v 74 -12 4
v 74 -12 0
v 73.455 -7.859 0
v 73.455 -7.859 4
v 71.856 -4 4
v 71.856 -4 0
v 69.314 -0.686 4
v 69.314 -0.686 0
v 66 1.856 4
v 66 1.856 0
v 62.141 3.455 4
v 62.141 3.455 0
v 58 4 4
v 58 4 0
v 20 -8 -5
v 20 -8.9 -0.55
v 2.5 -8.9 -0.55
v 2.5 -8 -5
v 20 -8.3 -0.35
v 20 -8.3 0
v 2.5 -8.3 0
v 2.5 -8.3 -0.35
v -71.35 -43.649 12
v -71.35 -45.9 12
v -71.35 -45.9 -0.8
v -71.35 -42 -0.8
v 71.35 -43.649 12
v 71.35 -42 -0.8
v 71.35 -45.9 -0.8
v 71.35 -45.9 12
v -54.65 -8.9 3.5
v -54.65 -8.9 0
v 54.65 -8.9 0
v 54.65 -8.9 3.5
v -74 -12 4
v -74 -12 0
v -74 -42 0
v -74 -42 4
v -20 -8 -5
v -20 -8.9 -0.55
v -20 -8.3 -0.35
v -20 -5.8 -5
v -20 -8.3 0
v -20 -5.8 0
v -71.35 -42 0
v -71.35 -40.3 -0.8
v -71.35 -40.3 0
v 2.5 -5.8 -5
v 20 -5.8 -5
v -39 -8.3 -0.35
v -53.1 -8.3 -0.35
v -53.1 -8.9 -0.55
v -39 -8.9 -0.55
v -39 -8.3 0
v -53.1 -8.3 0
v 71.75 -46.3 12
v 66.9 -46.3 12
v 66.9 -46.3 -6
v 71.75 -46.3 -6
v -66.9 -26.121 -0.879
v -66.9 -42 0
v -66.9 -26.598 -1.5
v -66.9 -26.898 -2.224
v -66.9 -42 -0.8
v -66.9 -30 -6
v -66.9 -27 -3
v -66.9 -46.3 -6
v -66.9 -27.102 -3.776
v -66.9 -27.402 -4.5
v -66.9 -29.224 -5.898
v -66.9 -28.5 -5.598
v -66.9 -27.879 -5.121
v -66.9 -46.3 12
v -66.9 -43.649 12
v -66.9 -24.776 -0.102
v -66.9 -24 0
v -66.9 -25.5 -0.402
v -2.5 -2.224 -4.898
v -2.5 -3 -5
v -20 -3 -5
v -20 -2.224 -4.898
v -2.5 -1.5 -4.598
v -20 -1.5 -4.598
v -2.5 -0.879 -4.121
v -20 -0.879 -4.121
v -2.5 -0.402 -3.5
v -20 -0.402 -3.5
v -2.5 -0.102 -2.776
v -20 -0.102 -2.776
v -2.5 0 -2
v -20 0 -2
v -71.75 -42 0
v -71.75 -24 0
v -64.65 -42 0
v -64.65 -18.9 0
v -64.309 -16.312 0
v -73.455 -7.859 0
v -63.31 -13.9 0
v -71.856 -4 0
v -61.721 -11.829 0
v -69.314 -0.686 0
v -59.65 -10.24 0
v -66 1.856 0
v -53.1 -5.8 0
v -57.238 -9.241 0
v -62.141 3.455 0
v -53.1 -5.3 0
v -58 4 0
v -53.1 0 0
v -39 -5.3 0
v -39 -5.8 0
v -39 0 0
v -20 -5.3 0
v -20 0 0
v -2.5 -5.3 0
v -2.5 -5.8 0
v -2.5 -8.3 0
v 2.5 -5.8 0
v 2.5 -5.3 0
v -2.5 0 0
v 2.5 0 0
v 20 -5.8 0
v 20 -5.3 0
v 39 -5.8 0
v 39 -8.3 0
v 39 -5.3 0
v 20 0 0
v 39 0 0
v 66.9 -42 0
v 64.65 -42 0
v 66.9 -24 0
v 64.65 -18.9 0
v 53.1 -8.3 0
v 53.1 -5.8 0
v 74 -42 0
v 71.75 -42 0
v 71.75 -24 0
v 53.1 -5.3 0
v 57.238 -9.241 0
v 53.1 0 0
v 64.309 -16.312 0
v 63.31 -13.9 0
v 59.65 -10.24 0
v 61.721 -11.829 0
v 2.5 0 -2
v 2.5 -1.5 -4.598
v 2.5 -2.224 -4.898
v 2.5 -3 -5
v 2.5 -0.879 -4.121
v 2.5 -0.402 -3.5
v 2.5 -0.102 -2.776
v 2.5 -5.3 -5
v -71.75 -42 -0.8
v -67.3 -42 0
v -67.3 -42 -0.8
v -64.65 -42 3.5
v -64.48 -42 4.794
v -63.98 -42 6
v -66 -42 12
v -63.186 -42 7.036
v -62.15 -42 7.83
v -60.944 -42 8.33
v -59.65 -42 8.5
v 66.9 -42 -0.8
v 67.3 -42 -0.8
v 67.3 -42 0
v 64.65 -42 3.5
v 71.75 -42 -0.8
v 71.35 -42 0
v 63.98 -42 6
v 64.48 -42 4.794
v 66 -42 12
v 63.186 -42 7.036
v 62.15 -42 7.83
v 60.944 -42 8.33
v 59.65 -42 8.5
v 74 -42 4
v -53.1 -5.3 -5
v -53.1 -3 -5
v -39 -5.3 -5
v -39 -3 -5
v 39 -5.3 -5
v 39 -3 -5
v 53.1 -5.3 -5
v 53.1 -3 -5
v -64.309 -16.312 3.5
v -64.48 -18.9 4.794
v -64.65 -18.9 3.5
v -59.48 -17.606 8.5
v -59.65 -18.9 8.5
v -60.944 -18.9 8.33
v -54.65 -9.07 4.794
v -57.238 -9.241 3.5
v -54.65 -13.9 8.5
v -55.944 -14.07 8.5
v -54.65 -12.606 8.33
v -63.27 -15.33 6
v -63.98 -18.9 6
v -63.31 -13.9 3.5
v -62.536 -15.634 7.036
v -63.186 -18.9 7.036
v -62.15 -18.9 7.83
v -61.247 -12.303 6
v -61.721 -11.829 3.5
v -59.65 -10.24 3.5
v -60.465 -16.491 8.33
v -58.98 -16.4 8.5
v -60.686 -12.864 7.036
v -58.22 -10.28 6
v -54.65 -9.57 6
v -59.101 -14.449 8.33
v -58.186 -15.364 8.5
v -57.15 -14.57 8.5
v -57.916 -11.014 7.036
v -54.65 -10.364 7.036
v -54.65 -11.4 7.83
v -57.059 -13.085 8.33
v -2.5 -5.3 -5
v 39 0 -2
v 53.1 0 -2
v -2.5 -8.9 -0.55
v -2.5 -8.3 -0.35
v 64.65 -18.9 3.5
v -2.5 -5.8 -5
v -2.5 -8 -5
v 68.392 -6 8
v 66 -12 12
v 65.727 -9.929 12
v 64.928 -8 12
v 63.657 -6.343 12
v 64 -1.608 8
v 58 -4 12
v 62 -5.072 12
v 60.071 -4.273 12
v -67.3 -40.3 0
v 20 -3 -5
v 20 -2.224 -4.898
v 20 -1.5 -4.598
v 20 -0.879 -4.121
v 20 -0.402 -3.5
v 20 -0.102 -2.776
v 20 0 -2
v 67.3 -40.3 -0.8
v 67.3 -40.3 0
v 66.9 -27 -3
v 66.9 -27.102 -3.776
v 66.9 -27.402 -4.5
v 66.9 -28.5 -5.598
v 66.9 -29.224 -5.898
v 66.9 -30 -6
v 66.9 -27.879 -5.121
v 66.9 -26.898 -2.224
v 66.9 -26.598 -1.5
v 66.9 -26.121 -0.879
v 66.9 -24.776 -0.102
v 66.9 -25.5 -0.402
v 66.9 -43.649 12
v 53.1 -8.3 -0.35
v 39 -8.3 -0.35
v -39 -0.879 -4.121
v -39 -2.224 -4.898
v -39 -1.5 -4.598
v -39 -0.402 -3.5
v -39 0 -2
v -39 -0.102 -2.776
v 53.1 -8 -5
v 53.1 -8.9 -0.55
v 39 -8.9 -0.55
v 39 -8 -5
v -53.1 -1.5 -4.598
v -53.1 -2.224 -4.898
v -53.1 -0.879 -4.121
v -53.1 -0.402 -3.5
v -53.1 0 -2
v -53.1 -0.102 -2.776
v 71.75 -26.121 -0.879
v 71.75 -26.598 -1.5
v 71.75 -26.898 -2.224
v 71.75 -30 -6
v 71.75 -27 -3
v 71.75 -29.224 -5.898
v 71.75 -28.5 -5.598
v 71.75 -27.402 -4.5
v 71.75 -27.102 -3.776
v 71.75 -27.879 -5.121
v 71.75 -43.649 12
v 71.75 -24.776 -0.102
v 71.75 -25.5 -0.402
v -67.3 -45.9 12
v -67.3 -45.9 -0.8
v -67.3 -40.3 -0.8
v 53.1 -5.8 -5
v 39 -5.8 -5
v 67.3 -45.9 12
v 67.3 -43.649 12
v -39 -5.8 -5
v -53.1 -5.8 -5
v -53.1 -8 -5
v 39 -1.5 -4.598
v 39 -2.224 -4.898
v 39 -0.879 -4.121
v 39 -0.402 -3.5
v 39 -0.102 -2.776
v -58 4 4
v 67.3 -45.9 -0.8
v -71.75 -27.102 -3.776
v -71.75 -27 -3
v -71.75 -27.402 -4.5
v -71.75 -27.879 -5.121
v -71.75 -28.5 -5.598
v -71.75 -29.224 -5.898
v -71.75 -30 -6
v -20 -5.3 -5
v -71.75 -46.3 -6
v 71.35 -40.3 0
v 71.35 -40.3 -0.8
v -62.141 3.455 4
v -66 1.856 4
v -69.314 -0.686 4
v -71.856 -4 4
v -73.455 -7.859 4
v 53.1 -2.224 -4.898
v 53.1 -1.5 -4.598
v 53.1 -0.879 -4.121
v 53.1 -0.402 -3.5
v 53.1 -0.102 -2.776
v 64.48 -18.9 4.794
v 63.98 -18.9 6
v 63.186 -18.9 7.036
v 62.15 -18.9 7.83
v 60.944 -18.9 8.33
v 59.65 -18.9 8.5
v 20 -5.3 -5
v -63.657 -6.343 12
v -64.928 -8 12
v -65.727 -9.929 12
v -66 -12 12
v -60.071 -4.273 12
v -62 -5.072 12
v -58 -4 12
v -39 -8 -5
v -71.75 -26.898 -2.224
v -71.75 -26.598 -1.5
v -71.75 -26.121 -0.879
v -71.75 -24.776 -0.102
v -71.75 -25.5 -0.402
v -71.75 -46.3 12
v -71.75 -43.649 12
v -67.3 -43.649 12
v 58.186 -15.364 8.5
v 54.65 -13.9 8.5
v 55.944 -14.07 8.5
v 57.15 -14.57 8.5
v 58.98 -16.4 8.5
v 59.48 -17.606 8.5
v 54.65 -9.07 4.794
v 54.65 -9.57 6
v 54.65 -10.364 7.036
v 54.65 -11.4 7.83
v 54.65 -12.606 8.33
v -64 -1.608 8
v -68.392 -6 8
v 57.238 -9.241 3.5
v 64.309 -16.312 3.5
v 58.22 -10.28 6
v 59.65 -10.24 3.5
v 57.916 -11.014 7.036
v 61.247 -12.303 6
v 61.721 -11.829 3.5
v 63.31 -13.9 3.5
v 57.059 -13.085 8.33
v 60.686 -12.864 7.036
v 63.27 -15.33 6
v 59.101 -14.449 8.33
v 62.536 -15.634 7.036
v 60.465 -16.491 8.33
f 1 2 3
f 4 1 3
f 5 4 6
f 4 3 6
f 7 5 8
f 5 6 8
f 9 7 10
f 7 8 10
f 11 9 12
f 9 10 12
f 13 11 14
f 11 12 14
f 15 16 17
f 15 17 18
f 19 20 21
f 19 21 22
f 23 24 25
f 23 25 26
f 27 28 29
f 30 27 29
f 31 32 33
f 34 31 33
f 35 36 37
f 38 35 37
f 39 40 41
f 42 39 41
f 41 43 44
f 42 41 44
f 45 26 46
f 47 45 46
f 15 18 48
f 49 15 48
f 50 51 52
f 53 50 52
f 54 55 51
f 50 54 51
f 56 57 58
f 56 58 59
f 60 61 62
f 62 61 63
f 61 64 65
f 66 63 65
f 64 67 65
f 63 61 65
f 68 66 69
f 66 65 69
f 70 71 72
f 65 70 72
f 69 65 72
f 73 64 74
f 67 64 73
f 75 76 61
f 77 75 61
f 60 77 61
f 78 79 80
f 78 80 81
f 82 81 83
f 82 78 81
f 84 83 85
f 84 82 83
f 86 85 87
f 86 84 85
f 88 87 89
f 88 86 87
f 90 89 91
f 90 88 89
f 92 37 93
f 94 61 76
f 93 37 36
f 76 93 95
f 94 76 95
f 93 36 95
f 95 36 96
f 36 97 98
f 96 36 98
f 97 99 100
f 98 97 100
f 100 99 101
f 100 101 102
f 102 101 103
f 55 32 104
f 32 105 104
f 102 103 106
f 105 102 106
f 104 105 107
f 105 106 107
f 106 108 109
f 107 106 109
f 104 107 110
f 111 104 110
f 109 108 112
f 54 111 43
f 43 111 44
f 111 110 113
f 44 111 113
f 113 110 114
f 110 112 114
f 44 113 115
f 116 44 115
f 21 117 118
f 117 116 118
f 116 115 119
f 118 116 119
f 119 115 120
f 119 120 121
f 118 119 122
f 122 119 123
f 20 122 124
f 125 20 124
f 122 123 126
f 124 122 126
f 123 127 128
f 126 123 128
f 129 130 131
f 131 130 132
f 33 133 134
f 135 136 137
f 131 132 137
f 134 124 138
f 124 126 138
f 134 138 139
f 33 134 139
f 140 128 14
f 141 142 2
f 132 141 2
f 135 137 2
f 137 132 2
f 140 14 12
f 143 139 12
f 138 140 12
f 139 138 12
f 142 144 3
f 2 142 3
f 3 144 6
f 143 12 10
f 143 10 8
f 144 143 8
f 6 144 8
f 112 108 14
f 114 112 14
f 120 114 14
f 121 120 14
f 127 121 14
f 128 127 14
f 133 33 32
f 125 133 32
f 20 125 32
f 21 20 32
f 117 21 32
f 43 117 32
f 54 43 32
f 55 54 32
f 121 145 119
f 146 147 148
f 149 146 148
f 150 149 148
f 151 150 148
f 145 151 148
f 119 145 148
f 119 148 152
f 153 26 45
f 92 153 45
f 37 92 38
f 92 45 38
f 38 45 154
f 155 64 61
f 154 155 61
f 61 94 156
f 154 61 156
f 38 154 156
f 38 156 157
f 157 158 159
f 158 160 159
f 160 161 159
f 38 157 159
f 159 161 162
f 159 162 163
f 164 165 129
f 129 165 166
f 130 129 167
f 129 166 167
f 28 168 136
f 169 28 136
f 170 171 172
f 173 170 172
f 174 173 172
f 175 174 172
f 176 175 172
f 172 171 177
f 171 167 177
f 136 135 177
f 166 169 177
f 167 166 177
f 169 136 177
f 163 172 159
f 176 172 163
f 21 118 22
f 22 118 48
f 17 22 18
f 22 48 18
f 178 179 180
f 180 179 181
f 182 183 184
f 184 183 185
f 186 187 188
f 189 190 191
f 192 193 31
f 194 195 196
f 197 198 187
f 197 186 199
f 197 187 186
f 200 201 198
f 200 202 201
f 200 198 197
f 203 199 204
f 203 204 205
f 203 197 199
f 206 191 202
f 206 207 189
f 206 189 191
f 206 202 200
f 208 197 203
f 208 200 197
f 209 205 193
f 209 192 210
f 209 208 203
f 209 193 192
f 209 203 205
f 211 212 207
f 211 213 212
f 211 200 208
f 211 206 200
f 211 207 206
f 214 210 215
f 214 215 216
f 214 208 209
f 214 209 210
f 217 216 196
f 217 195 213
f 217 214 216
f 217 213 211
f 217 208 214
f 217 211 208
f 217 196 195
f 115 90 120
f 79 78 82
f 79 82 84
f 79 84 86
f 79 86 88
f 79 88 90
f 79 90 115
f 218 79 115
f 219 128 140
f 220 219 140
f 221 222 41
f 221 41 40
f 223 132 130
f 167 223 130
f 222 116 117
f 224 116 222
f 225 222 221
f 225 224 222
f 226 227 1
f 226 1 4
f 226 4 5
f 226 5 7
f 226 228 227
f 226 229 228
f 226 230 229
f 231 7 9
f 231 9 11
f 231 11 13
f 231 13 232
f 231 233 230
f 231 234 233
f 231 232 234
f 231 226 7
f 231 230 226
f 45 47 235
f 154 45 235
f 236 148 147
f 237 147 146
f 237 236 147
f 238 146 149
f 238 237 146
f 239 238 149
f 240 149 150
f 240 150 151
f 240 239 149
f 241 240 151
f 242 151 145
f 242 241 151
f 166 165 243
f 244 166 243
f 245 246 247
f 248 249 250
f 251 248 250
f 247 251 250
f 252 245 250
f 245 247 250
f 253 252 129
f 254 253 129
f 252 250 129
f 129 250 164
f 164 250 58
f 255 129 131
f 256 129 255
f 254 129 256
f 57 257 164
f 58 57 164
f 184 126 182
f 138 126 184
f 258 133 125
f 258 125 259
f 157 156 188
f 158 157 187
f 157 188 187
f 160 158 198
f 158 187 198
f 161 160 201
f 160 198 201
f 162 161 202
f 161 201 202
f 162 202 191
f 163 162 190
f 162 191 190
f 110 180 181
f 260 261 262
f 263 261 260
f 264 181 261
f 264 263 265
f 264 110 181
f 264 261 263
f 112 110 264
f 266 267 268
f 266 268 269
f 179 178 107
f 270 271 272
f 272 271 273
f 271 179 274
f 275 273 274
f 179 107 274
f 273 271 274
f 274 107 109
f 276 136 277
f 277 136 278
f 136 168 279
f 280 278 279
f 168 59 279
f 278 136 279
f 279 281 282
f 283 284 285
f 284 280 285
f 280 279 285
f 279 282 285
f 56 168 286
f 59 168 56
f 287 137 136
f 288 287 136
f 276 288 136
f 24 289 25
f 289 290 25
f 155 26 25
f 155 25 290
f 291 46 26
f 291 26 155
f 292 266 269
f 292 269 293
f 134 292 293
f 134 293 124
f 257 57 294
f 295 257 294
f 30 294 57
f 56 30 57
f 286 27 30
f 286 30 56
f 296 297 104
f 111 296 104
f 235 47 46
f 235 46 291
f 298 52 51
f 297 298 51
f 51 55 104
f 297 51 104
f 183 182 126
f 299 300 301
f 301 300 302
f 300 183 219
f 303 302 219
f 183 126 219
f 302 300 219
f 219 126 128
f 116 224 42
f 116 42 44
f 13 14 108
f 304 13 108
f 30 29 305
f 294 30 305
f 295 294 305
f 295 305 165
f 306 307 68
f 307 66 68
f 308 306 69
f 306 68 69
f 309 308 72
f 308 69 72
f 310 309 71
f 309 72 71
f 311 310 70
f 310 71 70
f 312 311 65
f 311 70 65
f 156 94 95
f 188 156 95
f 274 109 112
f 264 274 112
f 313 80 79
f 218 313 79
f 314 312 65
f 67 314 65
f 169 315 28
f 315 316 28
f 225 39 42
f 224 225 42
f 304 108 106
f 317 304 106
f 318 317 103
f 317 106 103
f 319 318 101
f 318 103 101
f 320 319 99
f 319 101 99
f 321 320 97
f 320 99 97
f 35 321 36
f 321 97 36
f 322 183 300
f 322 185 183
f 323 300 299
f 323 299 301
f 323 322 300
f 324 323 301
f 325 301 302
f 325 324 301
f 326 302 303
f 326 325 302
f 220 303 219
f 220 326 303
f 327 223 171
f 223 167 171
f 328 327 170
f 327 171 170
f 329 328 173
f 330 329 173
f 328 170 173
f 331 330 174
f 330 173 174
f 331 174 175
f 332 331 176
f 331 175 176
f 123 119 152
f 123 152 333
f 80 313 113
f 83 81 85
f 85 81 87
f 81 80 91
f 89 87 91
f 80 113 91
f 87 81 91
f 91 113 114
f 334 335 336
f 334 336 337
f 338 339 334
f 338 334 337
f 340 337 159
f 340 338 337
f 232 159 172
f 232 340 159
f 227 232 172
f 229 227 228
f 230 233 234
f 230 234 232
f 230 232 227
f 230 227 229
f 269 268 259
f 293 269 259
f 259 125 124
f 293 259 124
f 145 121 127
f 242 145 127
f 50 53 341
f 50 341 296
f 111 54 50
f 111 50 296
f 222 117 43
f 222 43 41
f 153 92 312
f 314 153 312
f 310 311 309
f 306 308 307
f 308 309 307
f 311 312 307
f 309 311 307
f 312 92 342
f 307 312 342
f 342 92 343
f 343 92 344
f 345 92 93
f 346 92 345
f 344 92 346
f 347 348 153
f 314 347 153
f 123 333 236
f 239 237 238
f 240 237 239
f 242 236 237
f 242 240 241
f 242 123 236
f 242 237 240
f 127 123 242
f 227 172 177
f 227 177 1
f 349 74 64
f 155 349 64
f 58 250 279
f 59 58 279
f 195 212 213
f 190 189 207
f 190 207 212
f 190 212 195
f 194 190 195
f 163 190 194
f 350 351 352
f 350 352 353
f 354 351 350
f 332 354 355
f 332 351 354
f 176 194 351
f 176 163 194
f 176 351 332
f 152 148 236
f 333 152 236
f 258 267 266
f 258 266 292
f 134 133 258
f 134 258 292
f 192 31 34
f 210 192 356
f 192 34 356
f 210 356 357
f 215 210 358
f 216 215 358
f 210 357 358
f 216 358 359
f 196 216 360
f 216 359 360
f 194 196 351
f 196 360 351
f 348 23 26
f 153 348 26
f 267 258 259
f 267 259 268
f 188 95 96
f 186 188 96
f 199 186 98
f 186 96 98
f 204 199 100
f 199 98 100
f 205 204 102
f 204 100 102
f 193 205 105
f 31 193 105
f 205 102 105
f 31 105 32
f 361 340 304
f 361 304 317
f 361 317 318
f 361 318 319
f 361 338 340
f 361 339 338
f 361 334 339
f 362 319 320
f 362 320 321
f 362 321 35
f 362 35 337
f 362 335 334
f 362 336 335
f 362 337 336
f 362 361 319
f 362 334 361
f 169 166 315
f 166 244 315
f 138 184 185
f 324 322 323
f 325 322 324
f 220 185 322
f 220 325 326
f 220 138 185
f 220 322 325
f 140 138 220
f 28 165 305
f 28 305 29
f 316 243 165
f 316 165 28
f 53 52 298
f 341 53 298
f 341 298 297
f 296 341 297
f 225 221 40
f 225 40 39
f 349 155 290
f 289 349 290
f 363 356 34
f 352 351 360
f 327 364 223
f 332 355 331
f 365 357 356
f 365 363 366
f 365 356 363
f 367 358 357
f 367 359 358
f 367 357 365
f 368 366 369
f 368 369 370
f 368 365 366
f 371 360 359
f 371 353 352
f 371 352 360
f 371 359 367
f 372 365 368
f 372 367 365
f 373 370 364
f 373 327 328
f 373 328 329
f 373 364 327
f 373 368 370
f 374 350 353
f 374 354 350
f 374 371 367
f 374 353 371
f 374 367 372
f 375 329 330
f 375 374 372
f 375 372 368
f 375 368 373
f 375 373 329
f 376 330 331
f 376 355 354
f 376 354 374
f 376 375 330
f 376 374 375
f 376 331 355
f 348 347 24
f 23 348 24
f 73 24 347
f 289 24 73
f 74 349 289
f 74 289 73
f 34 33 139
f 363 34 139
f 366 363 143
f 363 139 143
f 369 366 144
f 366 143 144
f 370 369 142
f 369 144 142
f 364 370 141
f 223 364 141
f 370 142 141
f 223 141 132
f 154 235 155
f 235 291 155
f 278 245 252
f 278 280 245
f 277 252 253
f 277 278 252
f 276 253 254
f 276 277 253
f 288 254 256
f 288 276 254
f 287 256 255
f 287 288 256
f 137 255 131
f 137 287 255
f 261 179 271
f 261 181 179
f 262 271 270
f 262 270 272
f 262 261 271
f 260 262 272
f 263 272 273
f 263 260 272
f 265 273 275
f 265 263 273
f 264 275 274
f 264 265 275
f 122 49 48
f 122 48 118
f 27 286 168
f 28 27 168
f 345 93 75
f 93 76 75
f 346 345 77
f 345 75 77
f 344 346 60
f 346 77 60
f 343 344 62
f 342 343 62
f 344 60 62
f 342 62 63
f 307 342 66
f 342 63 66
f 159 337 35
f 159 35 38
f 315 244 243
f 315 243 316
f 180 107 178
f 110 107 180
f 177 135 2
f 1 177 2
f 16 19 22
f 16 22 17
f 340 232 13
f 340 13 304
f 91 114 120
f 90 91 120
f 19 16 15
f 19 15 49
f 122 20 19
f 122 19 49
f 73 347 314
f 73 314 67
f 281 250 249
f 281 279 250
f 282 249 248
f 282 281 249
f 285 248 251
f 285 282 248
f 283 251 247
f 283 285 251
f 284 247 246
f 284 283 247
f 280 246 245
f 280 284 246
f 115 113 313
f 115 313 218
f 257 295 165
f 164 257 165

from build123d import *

# Parameters (mm, degrees)
F2_DEPTH      = 12
F3_SIZE       = 8
F0_W          = 14.1
F0_H          = 8.3
F0_W_2        = 40
F4_DEPTH      = 5
F6_DEPTH      = 3
F7_DEPTH      = 20
F7_DEPTH_BACK = 20
F8_START      = 39
F8_DEPTH      = 14.1
F9_START      = -39
F9_DEPTH      = 14.1
F0_W_3        = 4.85
F0_H_2        = 13.3
F10_DEPTH     = 6
F12_DEPTH     = 8.5
F13_W         = 4.85
F13_H         = 5.2
F14_DEPTH     = 6
F15_R         = 2.99999
F16_R         = 5
F17_W         = 5
F17_H         = 8.9
F18_DEPTH     = 5
F20_DEPTH     = 0.8
F21_DEPTH     = 12
F23_DEPTH     = 145.751


# Not quite as in the source:
# - a fillet or chamfer is up to 0.001 mm smaller than in the source, because OpenCascade refuses the exact size


with BuildPart() as f2:
    # F1 (on Top) → F2 (new body)
    with BuildSketch(Plane.XY):
        with BuildLine():
            Line((58, 4), (-58, 4))
            ThreePointArc((-58, 4), (-69.313708499, -0.686291501), (-74, -12))
            Line((-74, -12), (-74, -42))
            Line((-74, -42), (74, -42))
            Line((74, -42), (74, -12))
            ThreePointArc((74, -12), (69.313708499, -0.686291501), (58, 4))
        make_face()
    extrude(amount=F2_DEPTH)

    # F3
    f3_edges = [f2.edges().sort_by_distance(p)[0] for p in [
        (74, -27, 12),
        (0, 4, 12),
        (-74, -27, 12),
    ]]
    chamfer(f3_edges, length=F3_SIZE)

    # F0 (on Top) → F4 (join)
    with BuildSketch(Plane.XY):
        with Locations((-46.05, -4.15)):
            Rectangle(F0_W, F0_H)
        with Locations((0, -4.15)):
            Rectangle(F0_W_2, F0_H)
        with Locations((46.05, -4.15)):
            Rectangle(F0_W, F0_H)
    extrude(amount=-F4_DEPTH)

    # F6 (cut): faces of the model
    f6_faces = [f2.faces().sort_by_distance(p)[0] for p in [
        (0, -8.3, -2.5),
        (46.05, -8.3, -2.5),
        (-46.05, -8.3, -2.5),
    ]]
    extrude(f6_faces, amount=-F6_DEPTH, mode=Mode.SUBTRACT)

    # F5 (on Right) → F7 (join, two sides)
    with BuildSketch(Plane.YZ) as f7_sk:
        Polygon((-5.8, 0), (-8.3, 0), (-8.3, -0.35), (-8.9, -0.55), (-8, -5), (-5.8, -5), align=None)
    extrude(amount=F7_DEPTH)
    extrude(f7_sk.sketch, amount=-F7_DEPTH_BACK)

    # F5 (on Right) → F8 (join)
    with BuildSketch(Plane.YZ.offset(F8_START)):
        Polygon((-5.8, 0), (-8.3, 0), (-8.3, -0.35), (-8.9, -0.55), (-8, -5), (-5.8, -5), align=None)
    extrude(amount=F8_DEPTH)

    # F5 (on Right) → F9 (join)
    with BuildSketch(Plane.YZ.offset(F9_START)):
        Polygon((-5.8, 0), (-8.3, 0), (-8.3, -0.35), (-8.9, -0.55), (-8, -5), (-5.8, -5), align=None)
    extrude(amount=-F9_DEPTH)

    # F0 (on Top) → F10 (join)
    with BuildSketch(Plane.XY):
        with Locations((69.325, -33.65)):
            Rectangle(F0_W_3, F0_H_2)
        with Locations((-69.325, -33.65)):
            Rectangle(F0_W_3, F0_H_2)
    extrude(amount=-F10_DEPTH)

    # F11 (on face) → F12 (cut)
    with BuildSketch(Plane(origin=(0, 0, 0), x_dir=(1, 0, 0), z_dir=(0, 0, -1))):
        with BuildLine():
            Line((64.65, 18.9), (64.65, 42))
            Line((64.65, 42), (-64.65, 42))
            Line((-64.65, 42), (-64.65, 18.9))
            ThreePointArc((-64.65, 18.9), (-61.7210678119, 11.8289321881), (-54.65, 8.9))
            Line((-54.65, 8.9), (54.65, 8.9))
            ThreePointArc((54.65, 8.9), (61.7210678119, 11.8289321881), (64.65, 18.9))
        make_face()
    extrude(amount=-F12_DEPTH, mode=Mode.SUBTRACT)

    # F13 (on face) → F14 (join)
    with BuildSketch(Plane.XZ.offset(40.3)):
        with Locations((69.325, -3.4)):
            Rectangle(F13_W, F13_H)
        with Locations((-69.325, -3.4)):
            Rectangle(F13_W, F13_H)
    extrude(amount=F14_DEPTH)

    # F15 (radius 3 in the source; OpenCascade refuses exactly that, so slightly less here)
    f15_edges = [f2.edges().sort_by_distance(p)[0] for p in [
        (0, 0, -5),
        (-46.05, 0, -5),
        (46.05, 0, -5),
        (-69.325, -27, -6),
        (69.325, -27, -6),
        (69.325, -27, 0),
        (-69.325, -27, 0),
    ]]
    fillet(f15_edges, radius=F15_R)

    # F16
    f16_edges = [f2.edges().sort_by_distance(p)[0] for p in [
        (64.65, -30.45, 8.5),
    ]]
    fillet(f16_edges, radius=F16_R)

    # F17 (on face) → F18 (cut, through all)
    with BuildSketch(Plane(origin=(0, 0, -5), x_dir=(1, 0, 0), z_dir=(0, 0, -1))):
        with Locations((0, 4.45)):
            Rectangle(F17_W, F17_H)
    extrude(amount=-F18_DEPTH, mode=Mode.SUBTRACT)

    # F19 (on face) → F20 (join, through all)
    with BuildSketch(Plane.XY.offset(-0.8)):
        Polygon((71.75, -46.3), (71.75, -40.3), (71.35, -40.3), (71.35, -45.9), (67.3, -45.9), (67.3, -40.3), (66.9, -40.3), (66.9, -46.3), align=None)
        Polygon((-71.35, -40.3), (-71.75, -40.3), (-71.75, -46.3), (-66.9, -46.3), (-66.9, -40.3), (-67.3, -40.3), (-67.3, -45.9), (-71.35, -45.9), align=None)
    extrude(amount=F20_DEPTH)

    # F21 (add, through all): faces of the model
    f21_faces = [f2.faces().sort_by_distance(p)[0] for p in [
        (69.325, -46.2351829498, 0),
        (-71.55, -42.0648170502, 0),
    ]]
    extrude(f21_faces, amount=F21_DEPTH)

    # F22 (on face) → F23 (cut, through all)
    with BuildSketch(Plane.YZ.offset(71.75)):
        Polygon((-42, -0.8), (-42, 12.0000000009), (-43.6490774155, 12), align=None)
    extrude(amount=-F23_DEPTH, mode=Mode.SUBTRACT)


solid = f2.part
